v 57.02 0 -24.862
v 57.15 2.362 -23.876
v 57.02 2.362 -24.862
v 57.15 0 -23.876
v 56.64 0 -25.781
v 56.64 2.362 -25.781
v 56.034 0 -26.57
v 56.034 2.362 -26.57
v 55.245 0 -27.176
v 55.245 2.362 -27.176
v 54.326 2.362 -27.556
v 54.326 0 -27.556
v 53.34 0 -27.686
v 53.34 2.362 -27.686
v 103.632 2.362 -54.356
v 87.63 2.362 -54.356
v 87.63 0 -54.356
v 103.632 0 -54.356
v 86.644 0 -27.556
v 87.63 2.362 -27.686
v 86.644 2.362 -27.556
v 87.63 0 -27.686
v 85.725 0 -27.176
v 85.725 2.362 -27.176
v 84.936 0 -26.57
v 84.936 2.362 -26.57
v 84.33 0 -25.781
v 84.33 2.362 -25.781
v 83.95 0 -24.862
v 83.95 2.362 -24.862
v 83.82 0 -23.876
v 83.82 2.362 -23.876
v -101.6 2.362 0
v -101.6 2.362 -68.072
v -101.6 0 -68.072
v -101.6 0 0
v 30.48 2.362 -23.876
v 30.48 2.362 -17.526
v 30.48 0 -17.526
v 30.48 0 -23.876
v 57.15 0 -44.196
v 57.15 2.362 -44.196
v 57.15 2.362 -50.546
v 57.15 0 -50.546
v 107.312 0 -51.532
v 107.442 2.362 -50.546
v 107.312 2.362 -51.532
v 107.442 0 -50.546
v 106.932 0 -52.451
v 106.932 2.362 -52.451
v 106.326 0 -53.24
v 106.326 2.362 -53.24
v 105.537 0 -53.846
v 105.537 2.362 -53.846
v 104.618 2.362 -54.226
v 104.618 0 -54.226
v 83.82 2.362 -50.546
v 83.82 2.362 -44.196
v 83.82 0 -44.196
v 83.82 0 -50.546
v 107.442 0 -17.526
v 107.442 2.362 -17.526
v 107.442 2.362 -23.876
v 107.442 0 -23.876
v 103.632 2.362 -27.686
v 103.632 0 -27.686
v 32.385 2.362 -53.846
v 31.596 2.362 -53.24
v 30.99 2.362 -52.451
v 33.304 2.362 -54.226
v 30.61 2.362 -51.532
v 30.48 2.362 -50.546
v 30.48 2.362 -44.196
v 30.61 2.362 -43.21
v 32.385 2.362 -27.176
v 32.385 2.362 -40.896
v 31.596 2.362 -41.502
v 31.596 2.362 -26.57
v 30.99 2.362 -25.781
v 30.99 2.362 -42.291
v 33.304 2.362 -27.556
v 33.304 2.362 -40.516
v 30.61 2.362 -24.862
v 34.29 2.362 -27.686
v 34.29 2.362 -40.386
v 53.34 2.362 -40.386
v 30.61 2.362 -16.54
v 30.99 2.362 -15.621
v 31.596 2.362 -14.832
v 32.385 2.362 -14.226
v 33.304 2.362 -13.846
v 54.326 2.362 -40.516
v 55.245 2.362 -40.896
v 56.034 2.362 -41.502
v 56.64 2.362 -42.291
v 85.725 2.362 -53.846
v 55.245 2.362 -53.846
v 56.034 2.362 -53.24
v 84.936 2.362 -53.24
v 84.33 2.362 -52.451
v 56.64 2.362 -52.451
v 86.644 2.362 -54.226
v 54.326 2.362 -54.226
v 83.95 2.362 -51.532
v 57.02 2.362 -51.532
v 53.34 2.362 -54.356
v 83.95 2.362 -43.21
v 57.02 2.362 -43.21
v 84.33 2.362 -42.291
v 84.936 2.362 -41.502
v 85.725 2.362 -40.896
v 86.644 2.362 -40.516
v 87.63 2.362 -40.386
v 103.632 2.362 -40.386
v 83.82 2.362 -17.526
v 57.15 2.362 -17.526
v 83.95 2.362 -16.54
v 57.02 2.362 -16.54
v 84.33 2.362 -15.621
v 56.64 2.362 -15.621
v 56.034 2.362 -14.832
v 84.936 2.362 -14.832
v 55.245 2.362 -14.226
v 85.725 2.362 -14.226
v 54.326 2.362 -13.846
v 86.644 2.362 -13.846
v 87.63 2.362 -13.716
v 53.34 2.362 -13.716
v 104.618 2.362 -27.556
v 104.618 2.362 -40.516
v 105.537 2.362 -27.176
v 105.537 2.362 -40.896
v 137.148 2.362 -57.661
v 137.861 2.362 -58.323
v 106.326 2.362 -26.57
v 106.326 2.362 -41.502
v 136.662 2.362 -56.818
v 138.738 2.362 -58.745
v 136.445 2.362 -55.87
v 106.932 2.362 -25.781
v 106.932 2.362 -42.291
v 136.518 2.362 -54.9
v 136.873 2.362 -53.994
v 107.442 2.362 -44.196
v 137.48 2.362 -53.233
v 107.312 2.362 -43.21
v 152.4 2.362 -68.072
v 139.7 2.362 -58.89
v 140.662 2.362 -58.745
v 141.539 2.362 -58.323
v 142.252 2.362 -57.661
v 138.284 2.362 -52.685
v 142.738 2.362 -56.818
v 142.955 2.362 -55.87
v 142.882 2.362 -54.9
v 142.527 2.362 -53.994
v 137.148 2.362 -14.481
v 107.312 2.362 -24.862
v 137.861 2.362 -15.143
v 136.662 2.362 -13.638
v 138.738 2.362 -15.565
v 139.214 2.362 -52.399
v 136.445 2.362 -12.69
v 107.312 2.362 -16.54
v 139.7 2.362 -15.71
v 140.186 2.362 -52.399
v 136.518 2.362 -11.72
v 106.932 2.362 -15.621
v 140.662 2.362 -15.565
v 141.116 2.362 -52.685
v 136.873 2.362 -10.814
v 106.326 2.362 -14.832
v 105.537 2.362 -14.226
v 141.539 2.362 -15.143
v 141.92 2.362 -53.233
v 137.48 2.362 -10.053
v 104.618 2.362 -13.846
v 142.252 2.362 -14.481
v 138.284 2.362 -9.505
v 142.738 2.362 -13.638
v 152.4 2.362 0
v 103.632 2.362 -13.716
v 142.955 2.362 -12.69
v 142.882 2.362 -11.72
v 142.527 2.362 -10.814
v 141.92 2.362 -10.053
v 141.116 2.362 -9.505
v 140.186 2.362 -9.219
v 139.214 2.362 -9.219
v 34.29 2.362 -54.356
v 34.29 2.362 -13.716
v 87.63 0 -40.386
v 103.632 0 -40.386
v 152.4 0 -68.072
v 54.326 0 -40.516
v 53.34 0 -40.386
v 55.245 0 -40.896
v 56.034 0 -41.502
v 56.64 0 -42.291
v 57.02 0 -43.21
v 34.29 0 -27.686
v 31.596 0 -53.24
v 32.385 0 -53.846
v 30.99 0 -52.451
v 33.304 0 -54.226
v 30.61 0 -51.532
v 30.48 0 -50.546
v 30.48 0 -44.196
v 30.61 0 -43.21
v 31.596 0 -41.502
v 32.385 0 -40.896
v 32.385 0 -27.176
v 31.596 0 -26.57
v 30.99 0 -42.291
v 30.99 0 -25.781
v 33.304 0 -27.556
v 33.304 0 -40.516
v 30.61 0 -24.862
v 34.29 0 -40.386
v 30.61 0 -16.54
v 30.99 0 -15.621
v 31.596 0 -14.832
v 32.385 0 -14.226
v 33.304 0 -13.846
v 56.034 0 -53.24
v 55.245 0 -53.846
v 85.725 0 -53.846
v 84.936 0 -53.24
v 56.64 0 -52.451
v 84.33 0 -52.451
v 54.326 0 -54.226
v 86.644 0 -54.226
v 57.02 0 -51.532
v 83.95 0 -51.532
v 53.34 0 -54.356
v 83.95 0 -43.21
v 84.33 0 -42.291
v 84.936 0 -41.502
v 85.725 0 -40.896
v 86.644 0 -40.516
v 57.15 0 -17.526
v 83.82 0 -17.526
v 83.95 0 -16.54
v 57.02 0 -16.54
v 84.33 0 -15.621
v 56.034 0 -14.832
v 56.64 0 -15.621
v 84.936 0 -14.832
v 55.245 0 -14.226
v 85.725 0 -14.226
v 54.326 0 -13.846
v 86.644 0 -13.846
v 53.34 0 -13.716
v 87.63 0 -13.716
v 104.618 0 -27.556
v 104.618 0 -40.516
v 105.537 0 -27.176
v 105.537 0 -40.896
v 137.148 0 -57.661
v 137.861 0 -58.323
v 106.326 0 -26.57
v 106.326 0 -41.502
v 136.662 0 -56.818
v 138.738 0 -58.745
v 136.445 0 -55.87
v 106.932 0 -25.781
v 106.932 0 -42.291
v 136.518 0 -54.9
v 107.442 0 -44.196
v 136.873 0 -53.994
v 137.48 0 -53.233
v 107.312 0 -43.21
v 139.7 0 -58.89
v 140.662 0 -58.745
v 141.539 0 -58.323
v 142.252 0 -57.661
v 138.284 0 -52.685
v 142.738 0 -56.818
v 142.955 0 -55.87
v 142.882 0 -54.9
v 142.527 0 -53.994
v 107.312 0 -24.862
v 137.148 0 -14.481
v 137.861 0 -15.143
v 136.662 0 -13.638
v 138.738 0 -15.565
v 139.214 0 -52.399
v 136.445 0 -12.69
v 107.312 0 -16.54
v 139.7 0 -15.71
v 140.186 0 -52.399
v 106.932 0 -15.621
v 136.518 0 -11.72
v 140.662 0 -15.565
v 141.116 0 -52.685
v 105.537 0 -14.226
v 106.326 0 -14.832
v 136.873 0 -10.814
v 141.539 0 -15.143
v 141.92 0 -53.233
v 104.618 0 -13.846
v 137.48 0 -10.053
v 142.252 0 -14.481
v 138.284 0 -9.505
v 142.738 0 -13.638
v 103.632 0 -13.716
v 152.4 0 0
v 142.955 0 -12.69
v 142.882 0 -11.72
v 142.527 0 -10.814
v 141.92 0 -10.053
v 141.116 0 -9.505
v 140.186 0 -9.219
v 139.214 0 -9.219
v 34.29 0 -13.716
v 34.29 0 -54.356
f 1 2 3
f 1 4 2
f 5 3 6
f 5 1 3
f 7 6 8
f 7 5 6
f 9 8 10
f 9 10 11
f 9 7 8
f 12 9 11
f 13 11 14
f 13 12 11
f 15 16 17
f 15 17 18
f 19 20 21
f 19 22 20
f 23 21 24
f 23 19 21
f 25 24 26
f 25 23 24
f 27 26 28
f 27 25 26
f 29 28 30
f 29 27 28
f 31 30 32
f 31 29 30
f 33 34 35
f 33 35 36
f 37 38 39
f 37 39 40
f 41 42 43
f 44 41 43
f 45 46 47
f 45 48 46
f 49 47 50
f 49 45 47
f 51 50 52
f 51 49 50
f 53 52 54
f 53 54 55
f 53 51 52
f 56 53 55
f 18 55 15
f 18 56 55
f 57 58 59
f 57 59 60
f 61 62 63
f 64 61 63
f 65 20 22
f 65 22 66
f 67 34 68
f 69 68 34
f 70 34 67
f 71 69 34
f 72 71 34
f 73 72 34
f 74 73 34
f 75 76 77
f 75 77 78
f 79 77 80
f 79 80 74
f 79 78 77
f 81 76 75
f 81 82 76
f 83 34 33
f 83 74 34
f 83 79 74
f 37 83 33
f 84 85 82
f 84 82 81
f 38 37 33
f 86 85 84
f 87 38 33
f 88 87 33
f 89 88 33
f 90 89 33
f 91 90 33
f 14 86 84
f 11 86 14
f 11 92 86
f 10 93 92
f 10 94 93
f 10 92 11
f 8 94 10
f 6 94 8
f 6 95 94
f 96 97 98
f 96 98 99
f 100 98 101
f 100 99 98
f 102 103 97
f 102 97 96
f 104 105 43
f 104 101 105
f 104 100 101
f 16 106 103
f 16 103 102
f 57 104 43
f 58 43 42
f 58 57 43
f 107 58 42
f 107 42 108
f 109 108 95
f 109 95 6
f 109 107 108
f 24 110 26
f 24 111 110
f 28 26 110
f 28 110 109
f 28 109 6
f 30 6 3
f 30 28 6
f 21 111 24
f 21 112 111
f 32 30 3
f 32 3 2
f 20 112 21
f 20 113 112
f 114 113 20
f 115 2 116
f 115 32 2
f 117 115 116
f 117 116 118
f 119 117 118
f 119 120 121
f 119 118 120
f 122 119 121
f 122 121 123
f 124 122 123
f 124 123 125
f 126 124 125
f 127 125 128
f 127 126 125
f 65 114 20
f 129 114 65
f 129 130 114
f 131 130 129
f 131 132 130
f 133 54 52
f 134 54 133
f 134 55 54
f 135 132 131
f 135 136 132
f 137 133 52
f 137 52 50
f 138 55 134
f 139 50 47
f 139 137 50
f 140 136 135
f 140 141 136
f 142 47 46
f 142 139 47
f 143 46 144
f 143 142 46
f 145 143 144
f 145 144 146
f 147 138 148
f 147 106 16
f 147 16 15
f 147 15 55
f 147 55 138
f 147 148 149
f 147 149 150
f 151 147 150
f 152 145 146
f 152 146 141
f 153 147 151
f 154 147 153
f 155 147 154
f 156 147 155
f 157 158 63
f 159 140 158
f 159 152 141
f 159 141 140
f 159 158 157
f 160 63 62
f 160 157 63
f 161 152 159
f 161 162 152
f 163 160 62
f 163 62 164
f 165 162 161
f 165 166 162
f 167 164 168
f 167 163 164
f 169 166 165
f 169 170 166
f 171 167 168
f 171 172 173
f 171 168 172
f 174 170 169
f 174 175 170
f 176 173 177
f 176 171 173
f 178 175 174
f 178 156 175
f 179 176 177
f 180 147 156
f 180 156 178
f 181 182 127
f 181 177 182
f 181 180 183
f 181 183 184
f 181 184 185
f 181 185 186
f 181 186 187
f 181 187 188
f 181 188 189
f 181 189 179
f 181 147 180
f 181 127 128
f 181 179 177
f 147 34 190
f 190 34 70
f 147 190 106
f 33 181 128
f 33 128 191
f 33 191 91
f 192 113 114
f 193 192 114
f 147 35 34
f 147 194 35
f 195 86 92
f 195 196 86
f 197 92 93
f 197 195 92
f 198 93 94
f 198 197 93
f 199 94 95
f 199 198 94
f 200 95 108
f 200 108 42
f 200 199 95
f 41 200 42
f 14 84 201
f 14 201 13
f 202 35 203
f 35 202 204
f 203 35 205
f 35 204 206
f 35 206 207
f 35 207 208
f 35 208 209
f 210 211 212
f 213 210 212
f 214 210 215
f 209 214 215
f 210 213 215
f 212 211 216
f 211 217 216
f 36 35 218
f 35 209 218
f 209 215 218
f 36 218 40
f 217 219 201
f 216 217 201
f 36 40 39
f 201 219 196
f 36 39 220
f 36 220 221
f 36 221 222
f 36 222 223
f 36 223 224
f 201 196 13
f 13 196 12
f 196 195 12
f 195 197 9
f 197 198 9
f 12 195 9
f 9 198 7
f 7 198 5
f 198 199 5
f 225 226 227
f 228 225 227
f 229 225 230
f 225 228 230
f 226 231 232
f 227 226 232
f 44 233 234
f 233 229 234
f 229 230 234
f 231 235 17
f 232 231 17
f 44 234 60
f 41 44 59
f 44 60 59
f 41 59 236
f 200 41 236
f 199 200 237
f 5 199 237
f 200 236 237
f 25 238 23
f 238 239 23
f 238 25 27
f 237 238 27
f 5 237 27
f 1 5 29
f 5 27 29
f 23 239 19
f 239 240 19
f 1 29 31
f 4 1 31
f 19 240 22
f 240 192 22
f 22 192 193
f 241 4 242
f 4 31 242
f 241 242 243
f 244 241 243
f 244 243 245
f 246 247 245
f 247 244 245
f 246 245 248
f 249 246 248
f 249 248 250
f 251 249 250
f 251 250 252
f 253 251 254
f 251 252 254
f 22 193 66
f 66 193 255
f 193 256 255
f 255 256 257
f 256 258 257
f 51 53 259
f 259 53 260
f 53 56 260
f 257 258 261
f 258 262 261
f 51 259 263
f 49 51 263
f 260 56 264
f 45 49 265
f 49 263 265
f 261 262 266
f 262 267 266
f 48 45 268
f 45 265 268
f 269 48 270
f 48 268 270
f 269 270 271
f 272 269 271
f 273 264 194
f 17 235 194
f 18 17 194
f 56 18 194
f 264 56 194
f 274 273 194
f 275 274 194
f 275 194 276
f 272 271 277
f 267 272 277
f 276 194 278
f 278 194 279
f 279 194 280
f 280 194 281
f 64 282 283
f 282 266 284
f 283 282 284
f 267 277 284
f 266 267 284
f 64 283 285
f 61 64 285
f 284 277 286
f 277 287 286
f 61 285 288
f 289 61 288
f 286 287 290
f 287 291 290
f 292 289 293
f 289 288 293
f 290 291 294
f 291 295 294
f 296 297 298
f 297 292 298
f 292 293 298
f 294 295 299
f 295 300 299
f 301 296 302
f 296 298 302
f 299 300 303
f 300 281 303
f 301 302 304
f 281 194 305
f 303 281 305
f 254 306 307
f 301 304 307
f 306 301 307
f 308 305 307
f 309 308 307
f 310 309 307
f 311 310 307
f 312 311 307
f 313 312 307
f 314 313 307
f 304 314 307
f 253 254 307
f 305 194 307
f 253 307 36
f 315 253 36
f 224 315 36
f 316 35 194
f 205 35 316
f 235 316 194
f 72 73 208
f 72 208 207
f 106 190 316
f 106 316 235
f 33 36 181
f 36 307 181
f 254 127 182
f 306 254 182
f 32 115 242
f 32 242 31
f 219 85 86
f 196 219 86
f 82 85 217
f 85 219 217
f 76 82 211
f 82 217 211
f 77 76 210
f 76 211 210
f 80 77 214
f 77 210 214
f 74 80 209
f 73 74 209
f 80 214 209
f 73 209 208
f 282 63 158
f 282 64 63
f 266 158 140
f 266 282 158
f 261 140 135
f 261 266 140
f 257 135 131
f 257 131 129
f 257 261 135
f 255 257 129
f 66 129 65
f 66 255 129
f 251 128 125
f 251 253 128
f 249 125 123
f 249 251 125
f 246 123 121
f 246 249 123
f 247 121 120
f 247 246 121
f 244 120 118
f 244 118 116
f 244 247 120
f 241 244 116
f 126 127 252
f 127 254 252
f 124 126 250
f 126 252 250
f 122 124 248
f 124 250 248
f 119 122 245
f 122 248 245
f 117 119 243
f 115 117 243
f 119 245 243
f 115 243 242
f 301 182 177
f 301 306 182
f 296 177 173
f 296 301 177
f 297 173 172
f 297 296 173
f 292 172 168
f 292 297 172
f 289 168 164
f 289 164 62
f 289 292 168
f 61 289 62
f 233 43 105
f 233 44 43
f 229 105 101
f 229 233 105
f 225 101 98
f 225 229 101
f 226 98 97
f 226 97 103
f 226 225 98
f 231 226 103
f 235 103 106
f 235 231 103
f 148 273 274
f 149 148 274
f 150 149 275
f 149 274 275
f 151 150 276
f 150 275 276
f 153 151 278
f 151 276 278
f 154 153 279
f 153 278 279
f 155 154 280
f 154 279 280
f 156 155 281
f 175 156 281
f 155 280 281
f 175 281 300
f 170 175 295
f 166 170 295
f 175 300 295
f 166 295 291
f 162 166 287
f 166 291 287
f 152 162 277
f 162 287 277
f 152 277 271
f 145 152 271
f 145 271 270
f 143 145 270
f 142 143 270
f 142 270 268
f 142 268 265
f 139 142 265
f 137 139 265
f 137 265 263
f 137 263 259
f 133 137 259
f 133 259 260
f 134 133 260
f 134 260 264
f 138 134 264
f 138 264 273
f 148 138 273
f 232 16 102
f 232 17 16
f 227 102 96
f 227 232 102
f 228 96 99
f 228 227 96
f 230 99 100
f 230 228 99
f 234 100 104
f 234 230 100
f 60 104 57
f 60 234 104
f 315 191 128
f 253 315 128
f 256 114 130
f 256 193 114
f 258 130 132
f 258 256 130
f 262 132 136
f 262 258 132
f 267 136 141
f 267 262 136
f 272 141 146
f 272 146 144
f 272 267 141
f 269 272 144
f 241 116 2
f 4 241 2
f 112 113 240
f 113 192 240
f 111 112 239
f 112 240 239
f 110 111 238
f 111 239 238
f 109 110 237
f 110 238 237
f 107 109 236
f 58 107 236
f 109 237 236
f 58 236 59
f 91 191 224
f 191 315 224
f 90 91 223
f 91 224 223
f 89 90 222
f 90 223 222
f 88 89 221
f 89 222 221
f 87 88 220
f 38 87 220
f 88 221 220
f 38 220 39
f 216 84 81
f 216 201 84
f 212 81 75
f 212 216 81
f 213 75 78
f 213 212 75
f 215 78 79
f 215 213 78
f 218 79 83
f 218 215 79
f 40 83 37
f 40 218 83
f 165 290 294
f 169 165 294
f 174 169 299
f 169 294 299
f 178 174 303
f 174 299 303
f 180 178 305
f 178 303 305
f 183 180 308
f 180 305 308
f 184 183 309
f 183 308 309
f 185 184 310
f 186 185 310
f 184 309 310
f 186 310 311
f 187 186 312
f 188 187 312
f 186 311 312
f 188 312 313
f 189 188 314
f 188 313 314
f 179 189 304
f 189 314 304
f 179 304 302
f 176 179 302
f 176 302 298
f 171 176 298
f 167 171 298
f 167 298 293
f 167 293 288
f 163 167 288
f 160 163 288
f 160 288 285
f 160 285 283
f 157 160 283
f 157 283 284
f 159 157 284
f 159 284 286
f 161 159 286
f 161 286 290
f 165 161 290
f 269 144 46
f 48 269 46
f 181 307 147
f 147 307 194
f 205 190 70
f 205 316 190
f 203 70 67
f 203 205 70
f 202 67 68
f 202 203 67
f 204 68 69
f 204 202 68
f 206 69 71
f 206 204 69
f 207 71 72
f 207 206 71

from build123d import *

# Parameters (mm, degrees)
SKETCH1_W           = 152.4
SKETCH1_H           = 68.072
BOSS_EXTRUDE1_DEPTH = 2.3622
SKETCH2_W           = 26.67
SKETCH2_H           = 13.97
SKETCH2_W_2         = 23.622
CUT_EXTRUDE1_DEPTH  = 167.92853912
FILLET1_R           = 3.81
SKETCH4_W           = 68.072
SKETCH4_H           = 2.3622
BOSS_EXTRUDE2_DEPTH = 101.6
SKETCH5_R           = 3.2639
CUT_EXTRUDE2_DEPTH  = 167.92853912


with BuildPart() as part:
    # Sketch1 → Boss-Extrude1 (new body)
    with BuildSketch(Plane(origin=(0, 0, 0), x_dir=(1, 0, 0), z_dir=(0, 1, 0))):
        with Locations((76.2, 34.036)):
            Rectangle(SKETCH1_W, SKETCH1_H)
    extrude(amount=BOSS_EXTRUDE1_DEPTH)

    # Sketch2 → Cut-Extrude1 (cut, through all)
    with BuildSketch(Plane(origin=(0, 2.3622, 0), x_dir=(1, 0, 0), z_dir=(0, 1, 0))):
        with Locations((43.815, 47.371)):
            Rectangle(SKETCH2_W, SKETCH2_H)
        with Locations((95.631, 47.371)):
            Rectangle(SKETCH2_W_2, SKETCH2_H)
        with Locations((43.815, 20.701)):
            Rectangle(SKETCH2_W, SKETCH2_H)
        with Locations((95.631, 20.701)):
            Rectangle(SKETCH2_W_2, SKETCH2_H)
    extrude(amount=-CUT_EXTRUDE1_DEPTH, mode=Mode.SUBTRACT)

    # Fillet1
    fillet1_edges = [part.edges().sort_by_distance(p)[0] for p in [
        (83.82, 1.1811, -40.386),
        (83.82, 1.1811, -54.356),
        (107.442, 1.1811, -54.356),
        (107.442, 1.1811, -40.386),
        (30.48, 1.1811, -13.716),
        (30.48, 1.1811, -27.686),
        (57.15, 1.1811, -27.686),
        (57.15, 1.1811, -13.716),
        (83.82, 1.1811, -13.716),
        (83.82, 1.1811, -27.686),
        (107.442, 1.1811, -27.686),
        (107.442, 1.1811, -13.716),
        (30.48, 1.1811, -40.386),
        (30.48, 1.1811, -54.356),
        (57.15, 1.1811, -54.356),
        (57.15, 1.1811, -40.386),
    ]]
    fillet(fillet1_edges, radius=FILLET1_R)

    # Sketch4 → Boss-Extrude2 (add)
    with BuildSketch(Plane.ZY):
        with Locations((-34.036, 1.1811)):
            Rectangle(SKETCH4_W, SKETCH4_H)
    extrude(amount=BOSS_EXTRUDE2_DEPTH)

    # Sketch5 → Cut-Extrude2 (cut, through all)
    with BuildSketch(Plane.XZ):
        with Locations(Location((139.7, -12.446, 0), (0, 0, 270))):
            Circle(SKETCH5_R)
        with Locations(Location((139.7, -55.626, 0), (0, 0, 270))):
            Circle(SKETCH5_R)
    extrude(amount=-CUT_EXTRUDE2_DEPTH, mode=Mode.SUBTRACT)


solid = part.part
